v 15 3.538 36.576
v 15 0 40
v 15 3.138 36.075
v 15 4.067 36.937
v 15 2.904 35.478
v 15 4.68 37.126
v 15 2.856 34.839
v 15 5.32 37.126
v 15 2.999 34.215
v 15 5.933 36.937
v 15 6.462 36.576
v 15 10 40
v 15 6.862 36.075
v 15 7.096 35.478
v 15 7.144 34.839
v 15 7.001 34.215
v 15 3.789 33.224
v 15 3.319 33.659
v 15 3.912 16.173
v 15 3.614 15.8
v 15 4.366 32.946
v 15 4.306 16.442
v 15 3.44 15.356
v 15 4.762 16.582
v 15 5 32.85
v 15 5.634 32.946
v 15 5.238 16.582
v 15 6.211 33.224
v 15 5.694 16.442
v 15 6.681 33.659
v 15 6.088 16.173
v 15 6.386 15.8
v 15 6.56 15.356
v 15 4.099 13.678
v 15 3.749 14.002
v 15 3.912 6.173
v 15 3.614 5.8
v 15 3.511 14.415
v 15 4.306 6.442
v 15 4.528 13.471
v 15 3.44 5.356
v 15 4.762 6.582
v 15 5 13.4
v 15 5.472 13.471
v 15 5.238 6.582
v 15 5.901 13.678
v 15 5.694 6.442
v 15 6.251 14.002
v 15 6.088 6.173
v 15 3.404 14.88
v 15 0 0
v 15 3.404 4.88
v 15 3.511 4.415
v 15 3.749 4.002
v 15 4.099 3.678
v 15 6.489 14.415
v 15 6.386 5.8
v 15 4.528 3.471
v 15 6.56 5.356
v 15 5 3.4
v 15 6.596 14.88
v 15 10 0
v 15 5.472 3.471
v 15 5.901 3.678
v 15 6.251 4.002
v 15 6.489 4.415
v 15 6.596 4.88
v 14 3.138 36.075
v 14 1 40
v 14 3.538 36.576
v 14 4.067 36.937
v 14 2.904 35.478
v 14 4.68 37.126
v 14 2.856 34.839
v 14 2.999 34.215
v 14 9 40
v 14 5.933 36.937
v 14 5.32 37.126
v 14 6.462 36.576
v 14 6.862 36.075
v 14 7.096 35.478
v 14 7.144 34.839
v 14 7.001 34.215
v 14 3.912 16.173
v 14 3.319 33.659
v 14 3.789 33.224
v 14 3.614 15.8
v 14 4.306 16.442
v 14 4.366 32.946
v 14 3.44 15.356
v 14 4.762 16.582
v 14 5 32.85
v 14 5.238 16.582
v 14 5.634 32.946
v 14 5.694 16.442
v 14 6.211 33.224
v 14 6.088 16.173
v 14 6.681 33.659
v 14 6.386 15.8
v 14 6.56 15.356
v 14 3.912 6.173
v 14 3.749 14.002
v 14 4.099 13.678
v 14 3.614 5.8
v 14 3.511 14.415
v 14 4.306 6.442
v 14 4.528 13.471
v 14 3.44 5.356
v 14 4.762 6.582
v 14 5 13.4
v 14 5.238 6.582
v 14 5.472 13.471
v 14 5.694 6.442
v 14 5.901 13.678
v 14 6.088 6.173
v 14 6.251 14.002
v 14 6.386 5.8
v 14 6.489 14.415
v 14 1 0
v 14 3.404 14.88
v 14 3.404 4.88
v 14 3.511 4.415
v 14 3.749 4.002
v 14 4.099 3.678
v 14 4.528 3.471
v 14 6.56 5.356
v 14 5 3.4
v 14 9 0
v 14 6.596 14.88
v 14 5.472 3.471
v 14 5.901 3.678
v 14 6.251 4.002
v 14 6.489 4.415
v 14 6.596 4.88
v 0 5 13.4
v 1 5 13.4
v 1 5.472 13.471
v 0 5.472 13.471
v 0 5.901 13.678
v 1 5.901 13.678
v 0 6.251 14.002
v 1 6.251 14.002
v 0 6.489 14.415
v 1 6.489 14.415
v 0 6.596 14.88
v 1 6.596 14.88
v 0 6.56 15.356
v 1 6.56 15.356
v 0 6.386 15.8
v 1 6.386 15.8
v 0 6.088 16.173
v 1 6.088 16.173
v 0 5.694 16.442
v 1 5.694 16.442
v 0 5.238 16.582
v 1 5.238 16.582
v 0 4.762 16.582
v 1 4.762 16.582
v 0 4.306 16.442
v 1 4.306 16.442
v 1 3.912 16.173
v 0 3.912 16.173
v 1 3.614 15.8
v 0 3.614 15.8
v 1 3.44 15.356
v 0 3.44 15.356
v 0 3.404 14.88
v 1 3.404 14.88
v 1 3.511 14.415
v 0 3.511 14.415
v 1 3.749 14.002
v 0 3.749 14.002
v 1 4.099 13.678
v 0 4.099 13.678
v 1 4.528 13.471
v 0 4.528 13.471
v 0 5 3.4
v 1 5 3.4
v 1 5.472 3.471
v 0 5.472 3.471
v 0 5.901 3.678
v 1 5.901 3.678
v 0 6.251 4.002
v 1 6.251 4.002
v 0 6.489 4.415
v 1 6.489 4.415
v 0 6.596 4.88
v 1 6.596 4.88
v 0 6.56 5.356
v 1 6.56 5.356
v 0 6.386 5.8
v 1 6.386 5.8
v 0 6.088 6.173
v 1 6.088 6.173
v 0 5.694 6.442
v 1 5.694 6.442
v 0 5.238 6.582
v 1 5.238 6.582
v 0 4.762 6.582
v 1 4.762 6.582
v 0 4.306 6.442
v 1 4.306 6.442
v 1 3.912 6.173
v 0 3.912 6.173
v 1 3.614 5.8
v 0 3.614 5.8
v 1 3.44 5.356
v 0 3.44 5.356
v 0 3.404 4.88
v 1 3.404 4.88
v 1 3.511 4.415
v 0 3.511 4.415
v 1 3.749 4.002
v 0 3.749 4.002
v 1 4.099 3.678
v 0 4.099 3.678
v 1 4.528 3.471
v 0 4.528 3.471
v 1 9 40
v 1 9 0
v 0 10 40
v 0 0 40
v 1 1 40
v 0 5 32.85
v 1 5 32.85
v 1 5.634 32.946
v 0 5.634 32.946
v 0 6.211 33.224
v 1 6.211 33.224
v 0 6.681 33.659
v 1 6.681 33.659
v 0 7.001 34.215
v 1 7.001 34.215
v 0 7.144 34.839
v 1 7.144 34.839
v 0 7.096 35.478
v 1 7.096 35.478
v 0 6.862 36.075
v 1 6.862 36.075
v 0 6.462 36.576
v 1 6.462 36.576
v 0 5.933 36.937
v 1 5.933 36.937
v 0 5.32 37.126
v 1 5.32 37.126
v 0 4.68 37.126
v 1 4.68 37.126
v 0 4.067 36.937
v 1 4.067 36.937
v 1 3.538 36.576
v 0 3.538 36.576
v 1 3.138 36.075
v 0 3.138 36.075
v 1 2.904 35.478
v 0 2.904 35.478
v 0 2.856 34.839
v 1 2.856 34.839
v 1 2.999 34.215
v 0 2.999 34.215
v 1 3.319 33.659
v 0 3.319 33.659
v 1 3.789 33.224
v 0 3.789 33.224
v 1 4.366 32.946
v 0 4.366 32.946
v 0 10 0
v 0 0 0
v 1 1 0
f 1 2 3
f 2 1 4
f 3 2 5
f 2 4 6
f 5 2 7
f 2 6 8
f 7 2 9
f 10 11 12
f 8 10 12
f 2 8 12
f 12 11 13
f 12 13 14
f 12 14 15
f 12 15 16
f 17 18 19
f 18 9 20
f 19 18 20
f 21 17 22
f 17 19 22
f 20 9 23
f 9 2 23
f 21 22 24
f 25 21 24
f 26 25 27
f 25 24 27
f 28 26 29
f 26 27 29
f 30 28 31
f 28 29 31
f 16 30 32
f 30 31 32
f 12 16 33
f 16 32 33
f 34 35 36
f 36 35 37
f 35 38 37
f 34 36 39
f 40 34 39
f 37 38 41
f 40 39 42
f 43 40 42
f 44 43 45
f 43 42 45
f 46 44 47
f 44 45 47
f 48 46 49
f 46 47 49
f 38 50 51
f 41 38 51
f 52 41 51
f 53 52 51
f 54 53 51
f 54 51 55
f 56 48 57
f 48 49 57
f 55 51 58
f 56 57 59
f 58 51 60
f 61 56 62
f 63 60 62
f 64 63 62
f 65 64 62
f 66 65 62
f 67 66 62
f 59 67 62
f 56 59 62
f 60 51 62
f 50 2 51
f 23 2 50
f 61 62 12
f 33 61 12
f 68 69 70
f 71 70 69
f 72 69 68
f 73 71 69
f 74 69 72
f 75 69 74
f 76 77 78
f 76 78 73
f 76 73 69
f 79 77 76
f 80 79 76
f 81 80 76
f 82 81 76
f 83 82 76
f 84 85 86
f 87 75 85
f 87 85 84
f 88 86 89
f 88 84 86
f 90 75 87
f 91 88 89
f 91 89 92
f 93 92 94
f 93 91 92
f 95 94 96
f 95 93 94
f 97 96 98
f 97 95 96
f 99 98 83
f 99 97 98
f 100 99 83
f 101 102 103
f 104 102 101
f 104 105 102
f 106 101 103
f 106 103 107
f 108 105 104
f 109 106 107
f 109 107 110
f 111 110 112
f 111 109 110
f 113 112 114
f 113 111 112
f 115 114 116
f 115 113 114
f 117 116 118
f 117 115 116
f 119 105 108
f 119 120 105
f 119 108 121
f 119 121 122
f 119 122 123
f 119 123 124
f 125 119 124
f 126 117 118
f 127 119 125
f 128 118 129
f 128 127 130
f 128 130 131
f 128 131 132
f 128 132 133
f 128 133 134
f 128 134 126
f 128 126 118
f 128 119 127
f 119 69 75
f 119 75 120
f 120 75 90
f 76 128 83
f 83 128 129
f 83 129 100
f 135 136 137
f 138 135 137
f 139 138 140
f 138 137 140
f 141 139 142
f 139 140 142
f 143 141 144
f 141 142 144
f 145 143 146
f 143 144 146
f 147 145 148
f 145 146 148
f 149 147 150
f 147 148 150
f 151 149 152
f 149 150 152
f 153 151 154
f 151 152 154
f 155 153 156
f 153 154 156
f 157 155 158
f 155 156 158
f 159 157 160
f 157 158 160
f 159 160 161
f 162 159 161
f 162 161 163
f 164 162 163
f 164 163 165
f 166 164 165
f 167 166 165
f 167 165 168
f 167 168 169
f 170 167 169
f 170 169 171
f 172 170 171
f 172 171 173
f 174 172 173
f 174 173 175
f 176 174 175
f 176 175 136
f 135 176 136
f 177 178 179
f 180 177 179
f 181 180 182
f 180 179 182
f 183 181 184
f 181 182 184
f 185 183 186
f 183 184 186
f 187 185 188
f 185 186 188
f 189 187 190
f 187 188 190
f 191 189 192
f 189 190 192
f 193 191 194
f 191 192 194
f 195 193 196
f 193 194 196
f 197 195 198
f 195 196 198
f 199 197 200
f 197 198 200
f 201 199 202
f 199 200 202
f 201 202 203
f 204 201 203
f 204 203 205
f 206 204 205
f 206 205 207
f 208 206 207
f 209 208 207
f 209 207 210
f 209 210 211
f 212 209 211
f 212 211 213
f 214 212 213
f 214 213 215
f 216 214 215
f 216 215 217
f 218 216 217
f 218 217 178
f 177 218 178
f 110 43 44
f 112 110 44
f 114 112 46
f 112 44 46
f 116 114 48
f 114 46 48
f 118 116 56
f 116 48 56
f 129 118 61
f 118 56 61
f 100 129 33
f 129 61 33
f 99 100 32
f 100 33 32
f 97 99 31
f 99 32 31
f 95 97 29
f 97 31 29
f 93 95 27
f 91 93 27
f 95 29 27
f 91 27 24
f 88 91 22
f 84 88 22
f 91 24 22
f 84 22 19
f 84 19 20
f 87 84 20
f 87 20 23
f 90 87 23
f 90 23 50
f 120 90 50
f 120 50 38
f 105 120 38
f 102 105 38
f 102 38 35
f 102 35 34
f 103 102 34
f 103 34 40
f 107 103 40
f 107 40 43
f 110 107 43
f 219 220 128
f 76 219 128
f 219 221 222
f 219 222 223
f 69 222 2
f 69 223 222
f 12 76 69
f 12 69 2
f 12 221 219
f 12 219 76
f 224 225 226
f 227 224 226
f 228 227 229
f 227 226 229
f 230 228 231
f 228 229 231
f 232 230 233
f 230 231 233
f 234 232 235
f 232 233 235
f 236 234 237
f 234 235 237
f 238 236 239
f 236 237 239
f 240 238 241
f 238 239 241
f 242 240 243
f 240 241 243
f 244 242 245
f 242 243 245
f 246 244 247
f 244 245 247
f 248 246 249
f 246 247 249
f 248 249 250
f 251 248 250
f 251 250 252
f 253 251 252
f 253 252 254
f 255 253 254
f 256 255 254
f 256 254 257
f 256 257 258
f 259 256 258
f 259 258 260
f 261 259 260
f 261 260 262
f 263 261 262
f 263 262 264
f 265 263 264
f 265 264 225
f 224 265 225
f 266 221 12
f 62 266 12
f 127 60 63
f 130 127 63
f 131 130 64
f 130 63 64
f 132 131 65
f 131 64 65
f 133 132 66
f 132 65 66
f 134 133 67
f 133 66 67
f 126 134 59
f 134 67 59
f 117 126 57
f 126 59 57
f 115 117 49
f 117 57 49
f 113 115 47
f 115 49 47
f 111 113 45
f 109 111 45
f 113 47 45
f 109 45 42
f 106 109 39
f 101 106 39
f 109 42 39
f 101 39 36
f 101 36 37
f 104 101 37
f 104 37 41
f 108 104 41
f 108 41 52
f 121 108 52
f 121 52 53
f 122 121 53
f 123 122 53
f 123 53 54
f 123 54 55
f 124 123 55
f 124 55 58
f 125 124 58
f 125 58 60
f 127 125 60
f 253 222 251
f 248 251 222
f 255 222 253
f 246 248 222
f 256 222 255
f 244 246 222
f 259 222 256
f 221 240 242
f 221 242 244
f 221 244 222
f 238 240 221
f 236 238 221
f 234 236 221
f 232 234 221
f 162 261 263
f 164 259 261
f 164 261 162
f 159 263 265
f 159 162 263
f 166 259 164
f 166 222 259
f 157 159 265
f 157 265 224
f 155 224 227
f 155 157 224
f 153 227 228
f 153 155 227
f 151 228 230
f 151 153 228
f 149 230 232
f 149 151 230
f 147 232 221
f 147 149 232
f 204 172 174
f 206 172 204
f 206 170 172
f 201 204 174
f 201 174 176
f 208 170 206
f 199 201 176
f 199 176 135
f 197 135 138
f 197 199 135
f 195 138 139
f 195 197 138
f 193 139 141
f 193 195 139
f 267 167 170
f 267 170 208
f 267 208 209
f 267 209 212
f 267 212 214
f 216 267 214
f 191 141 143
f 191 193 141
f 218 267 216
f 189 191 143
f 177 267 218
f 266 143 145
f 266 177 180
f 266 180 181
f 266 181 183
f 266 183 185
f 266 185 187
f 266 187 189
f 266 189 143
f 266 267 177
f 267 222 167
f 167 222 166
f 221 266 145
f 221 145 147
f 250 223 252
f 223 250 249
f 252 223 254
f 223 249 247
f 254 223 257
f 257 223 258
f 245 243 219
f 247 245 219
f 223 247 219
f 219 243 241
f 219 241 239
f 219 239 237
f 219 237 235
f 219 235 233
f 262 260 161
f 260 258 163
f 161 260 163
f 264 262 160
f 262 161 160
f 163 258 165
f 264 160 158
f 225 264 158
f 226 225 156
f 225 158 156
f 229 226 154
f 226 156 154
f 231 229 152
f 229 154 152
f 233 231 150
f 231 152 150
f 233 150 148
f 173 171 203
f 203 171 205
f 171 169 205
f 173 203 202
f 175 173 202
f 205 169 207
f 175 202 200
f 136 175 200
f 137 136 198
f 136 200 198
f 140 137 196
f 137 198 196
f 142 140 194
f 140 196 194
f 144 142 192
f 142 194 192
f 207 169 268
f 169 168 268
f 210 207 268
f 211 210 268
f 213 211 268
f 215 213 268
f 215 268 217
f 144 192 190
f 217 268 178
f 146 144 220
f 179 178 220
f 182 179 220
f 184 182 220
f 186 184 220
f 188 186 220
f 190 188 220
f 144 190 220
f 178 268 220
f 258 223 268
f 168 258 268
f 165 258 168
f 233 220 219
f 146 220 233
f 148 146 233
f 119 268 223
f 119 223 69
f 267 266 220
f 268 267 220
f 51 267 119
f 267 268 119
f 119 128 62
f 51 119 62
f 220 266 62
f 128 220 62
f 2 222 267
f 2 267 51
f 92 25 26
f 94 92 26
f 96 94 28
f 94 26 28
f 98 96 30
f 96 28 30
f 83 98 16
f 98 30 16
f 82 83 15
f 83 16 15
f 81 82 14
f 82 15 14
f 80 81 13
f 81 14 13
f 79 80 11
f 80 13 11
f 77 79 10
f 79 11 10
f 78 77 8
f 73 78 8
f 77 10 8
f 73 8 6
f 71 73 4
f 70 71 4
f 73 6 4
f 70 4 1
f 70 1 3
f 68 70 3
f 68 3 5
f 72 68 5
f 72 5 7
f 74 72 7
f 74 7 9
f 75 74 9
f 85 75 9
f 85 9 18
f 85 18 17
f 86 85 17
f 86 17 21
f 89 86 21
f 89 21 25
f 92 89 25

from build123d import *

# Parameters (mm, degrees)
SKETCH_1_W          = 15
SKETCH_1_H          = 10
SKETCH_1_W_2        = 13
SKETCH_1_H_2        = 8
EXTRUDE_1_DEPTH     = 40
CUT_EXTRUDE_1_REACH = 45.875
SKETCH_2_R          = 1.6
SKETCH_2_R_2        = 2.15


with BuildPart() as part:
    # ｽｹｯﾁ1 → 押し出し-薄板1 (new body)
    with BuildSketch(Plane.XY):
        with Locations((7.5, 5)):
            Rectangle(SKETCH_1_W, SKETCH_1_H)
        with Locations((7.5, 5)):
            Rectangle(SKETCH_1_W_2, SKETCH_1_H_2, mode=Mode.SUBTRACT)
    extrude(amount=EXTRUDE_1_DEPTH)

    # ｶｯﾄ - 押し出し1: up to this face of the body (flat: up to its plane)
    cut_extrude_1_end = Plane(part.part.faces().sort_by_distance((0, 5, 20))[0])
    # ｽｹｯﾁ2 → ｶｯﾄ - 押し出し1 (cut, up to the picked face)
    with BuildSketch(Plane(origin=(15, 0, 0), x_dir=(0, 0, -1), z_dir=(1, 0, 0)), mode=Mode.PRIVATE) as cut_extrude_1_sk1:
        with Locations((-5, 5)):
            Circle(SKETCH_2_R)
    cut_extrude_1_tool1 = split(extrude(cut_extrude_1_sk1.sketch, amount=-CUT_EXTRUDE_1_REACH, mode=Mode.PRIVATE), bisect_by=cut_extrude_1_end, keep=Keep.BOTH, mode=Mode.PRIVATE)
    # ｽｹｯﾁ2 → ｶｯﾄ - 押し出し1 (cut, up to the picked face)
    with BuildSketch(Plane(origin=(15, 0, 0), x_dir=(0, 0, -1), z_dir=(1, 0, 0)), mode=Mode.PRIVATE) as cut_extrude_1_sk2:
        with Locations((-15, 5)):
            Circle(SKETCH_2_R)
    cut_extrude_1_tool2 = split(extrude(cut_extrude_1_sk2.sketch, amount=-CUT_EXTRUDE_1_REACH, mode=Mode.PRIVATE), bisect_by=cut_extrude_1_end, keep=Keep.BOTH, mode=Mode.PRIVATE)
    # ｽｹｯﾁ2 → ｶｯﾄ - 押し出し1 (cut, up to the picked face)
    with BuildSketch(Plane(origin=(15, 0, 0), x_dir=(0, 0, -1), z_dir=(1, 0, 0)), mode=Mode.PRIVATE) as cut_extrude_1_sk3:
        with Locations((-35, 5)):
            Circle(SKETCH_2_R_2)
    cut_extrude_1_tool3 = split(extrude(cut_extrude_1_sk3.sketch, amount=-CUT_EXTRUDE_1_REACH, mode=Mode.PRIVATE), bisect_by=cut_extrude_1_end, keep=Keep.BOTH, mode=Mode.PRIVATE)
    add(cut_extrude_1_tool1.solids().sort_by(Axis((15, 5, 5), (-1, 0, 0)))[0], mode=Mode.SUBTRACT)
    add(cut_extrude_1_tool2.solids().sort_by(Axis((15, 5, 15), (-1, 0, 0)))[0], mode=Mode.SUBTRACT)
    add(cut_extrude_1_tool3.solids().sort_by(Axis((15, 5, 35), (-1, 0, 0)))[0], mode=Mode.SUBTRACT)


solid = part.part
